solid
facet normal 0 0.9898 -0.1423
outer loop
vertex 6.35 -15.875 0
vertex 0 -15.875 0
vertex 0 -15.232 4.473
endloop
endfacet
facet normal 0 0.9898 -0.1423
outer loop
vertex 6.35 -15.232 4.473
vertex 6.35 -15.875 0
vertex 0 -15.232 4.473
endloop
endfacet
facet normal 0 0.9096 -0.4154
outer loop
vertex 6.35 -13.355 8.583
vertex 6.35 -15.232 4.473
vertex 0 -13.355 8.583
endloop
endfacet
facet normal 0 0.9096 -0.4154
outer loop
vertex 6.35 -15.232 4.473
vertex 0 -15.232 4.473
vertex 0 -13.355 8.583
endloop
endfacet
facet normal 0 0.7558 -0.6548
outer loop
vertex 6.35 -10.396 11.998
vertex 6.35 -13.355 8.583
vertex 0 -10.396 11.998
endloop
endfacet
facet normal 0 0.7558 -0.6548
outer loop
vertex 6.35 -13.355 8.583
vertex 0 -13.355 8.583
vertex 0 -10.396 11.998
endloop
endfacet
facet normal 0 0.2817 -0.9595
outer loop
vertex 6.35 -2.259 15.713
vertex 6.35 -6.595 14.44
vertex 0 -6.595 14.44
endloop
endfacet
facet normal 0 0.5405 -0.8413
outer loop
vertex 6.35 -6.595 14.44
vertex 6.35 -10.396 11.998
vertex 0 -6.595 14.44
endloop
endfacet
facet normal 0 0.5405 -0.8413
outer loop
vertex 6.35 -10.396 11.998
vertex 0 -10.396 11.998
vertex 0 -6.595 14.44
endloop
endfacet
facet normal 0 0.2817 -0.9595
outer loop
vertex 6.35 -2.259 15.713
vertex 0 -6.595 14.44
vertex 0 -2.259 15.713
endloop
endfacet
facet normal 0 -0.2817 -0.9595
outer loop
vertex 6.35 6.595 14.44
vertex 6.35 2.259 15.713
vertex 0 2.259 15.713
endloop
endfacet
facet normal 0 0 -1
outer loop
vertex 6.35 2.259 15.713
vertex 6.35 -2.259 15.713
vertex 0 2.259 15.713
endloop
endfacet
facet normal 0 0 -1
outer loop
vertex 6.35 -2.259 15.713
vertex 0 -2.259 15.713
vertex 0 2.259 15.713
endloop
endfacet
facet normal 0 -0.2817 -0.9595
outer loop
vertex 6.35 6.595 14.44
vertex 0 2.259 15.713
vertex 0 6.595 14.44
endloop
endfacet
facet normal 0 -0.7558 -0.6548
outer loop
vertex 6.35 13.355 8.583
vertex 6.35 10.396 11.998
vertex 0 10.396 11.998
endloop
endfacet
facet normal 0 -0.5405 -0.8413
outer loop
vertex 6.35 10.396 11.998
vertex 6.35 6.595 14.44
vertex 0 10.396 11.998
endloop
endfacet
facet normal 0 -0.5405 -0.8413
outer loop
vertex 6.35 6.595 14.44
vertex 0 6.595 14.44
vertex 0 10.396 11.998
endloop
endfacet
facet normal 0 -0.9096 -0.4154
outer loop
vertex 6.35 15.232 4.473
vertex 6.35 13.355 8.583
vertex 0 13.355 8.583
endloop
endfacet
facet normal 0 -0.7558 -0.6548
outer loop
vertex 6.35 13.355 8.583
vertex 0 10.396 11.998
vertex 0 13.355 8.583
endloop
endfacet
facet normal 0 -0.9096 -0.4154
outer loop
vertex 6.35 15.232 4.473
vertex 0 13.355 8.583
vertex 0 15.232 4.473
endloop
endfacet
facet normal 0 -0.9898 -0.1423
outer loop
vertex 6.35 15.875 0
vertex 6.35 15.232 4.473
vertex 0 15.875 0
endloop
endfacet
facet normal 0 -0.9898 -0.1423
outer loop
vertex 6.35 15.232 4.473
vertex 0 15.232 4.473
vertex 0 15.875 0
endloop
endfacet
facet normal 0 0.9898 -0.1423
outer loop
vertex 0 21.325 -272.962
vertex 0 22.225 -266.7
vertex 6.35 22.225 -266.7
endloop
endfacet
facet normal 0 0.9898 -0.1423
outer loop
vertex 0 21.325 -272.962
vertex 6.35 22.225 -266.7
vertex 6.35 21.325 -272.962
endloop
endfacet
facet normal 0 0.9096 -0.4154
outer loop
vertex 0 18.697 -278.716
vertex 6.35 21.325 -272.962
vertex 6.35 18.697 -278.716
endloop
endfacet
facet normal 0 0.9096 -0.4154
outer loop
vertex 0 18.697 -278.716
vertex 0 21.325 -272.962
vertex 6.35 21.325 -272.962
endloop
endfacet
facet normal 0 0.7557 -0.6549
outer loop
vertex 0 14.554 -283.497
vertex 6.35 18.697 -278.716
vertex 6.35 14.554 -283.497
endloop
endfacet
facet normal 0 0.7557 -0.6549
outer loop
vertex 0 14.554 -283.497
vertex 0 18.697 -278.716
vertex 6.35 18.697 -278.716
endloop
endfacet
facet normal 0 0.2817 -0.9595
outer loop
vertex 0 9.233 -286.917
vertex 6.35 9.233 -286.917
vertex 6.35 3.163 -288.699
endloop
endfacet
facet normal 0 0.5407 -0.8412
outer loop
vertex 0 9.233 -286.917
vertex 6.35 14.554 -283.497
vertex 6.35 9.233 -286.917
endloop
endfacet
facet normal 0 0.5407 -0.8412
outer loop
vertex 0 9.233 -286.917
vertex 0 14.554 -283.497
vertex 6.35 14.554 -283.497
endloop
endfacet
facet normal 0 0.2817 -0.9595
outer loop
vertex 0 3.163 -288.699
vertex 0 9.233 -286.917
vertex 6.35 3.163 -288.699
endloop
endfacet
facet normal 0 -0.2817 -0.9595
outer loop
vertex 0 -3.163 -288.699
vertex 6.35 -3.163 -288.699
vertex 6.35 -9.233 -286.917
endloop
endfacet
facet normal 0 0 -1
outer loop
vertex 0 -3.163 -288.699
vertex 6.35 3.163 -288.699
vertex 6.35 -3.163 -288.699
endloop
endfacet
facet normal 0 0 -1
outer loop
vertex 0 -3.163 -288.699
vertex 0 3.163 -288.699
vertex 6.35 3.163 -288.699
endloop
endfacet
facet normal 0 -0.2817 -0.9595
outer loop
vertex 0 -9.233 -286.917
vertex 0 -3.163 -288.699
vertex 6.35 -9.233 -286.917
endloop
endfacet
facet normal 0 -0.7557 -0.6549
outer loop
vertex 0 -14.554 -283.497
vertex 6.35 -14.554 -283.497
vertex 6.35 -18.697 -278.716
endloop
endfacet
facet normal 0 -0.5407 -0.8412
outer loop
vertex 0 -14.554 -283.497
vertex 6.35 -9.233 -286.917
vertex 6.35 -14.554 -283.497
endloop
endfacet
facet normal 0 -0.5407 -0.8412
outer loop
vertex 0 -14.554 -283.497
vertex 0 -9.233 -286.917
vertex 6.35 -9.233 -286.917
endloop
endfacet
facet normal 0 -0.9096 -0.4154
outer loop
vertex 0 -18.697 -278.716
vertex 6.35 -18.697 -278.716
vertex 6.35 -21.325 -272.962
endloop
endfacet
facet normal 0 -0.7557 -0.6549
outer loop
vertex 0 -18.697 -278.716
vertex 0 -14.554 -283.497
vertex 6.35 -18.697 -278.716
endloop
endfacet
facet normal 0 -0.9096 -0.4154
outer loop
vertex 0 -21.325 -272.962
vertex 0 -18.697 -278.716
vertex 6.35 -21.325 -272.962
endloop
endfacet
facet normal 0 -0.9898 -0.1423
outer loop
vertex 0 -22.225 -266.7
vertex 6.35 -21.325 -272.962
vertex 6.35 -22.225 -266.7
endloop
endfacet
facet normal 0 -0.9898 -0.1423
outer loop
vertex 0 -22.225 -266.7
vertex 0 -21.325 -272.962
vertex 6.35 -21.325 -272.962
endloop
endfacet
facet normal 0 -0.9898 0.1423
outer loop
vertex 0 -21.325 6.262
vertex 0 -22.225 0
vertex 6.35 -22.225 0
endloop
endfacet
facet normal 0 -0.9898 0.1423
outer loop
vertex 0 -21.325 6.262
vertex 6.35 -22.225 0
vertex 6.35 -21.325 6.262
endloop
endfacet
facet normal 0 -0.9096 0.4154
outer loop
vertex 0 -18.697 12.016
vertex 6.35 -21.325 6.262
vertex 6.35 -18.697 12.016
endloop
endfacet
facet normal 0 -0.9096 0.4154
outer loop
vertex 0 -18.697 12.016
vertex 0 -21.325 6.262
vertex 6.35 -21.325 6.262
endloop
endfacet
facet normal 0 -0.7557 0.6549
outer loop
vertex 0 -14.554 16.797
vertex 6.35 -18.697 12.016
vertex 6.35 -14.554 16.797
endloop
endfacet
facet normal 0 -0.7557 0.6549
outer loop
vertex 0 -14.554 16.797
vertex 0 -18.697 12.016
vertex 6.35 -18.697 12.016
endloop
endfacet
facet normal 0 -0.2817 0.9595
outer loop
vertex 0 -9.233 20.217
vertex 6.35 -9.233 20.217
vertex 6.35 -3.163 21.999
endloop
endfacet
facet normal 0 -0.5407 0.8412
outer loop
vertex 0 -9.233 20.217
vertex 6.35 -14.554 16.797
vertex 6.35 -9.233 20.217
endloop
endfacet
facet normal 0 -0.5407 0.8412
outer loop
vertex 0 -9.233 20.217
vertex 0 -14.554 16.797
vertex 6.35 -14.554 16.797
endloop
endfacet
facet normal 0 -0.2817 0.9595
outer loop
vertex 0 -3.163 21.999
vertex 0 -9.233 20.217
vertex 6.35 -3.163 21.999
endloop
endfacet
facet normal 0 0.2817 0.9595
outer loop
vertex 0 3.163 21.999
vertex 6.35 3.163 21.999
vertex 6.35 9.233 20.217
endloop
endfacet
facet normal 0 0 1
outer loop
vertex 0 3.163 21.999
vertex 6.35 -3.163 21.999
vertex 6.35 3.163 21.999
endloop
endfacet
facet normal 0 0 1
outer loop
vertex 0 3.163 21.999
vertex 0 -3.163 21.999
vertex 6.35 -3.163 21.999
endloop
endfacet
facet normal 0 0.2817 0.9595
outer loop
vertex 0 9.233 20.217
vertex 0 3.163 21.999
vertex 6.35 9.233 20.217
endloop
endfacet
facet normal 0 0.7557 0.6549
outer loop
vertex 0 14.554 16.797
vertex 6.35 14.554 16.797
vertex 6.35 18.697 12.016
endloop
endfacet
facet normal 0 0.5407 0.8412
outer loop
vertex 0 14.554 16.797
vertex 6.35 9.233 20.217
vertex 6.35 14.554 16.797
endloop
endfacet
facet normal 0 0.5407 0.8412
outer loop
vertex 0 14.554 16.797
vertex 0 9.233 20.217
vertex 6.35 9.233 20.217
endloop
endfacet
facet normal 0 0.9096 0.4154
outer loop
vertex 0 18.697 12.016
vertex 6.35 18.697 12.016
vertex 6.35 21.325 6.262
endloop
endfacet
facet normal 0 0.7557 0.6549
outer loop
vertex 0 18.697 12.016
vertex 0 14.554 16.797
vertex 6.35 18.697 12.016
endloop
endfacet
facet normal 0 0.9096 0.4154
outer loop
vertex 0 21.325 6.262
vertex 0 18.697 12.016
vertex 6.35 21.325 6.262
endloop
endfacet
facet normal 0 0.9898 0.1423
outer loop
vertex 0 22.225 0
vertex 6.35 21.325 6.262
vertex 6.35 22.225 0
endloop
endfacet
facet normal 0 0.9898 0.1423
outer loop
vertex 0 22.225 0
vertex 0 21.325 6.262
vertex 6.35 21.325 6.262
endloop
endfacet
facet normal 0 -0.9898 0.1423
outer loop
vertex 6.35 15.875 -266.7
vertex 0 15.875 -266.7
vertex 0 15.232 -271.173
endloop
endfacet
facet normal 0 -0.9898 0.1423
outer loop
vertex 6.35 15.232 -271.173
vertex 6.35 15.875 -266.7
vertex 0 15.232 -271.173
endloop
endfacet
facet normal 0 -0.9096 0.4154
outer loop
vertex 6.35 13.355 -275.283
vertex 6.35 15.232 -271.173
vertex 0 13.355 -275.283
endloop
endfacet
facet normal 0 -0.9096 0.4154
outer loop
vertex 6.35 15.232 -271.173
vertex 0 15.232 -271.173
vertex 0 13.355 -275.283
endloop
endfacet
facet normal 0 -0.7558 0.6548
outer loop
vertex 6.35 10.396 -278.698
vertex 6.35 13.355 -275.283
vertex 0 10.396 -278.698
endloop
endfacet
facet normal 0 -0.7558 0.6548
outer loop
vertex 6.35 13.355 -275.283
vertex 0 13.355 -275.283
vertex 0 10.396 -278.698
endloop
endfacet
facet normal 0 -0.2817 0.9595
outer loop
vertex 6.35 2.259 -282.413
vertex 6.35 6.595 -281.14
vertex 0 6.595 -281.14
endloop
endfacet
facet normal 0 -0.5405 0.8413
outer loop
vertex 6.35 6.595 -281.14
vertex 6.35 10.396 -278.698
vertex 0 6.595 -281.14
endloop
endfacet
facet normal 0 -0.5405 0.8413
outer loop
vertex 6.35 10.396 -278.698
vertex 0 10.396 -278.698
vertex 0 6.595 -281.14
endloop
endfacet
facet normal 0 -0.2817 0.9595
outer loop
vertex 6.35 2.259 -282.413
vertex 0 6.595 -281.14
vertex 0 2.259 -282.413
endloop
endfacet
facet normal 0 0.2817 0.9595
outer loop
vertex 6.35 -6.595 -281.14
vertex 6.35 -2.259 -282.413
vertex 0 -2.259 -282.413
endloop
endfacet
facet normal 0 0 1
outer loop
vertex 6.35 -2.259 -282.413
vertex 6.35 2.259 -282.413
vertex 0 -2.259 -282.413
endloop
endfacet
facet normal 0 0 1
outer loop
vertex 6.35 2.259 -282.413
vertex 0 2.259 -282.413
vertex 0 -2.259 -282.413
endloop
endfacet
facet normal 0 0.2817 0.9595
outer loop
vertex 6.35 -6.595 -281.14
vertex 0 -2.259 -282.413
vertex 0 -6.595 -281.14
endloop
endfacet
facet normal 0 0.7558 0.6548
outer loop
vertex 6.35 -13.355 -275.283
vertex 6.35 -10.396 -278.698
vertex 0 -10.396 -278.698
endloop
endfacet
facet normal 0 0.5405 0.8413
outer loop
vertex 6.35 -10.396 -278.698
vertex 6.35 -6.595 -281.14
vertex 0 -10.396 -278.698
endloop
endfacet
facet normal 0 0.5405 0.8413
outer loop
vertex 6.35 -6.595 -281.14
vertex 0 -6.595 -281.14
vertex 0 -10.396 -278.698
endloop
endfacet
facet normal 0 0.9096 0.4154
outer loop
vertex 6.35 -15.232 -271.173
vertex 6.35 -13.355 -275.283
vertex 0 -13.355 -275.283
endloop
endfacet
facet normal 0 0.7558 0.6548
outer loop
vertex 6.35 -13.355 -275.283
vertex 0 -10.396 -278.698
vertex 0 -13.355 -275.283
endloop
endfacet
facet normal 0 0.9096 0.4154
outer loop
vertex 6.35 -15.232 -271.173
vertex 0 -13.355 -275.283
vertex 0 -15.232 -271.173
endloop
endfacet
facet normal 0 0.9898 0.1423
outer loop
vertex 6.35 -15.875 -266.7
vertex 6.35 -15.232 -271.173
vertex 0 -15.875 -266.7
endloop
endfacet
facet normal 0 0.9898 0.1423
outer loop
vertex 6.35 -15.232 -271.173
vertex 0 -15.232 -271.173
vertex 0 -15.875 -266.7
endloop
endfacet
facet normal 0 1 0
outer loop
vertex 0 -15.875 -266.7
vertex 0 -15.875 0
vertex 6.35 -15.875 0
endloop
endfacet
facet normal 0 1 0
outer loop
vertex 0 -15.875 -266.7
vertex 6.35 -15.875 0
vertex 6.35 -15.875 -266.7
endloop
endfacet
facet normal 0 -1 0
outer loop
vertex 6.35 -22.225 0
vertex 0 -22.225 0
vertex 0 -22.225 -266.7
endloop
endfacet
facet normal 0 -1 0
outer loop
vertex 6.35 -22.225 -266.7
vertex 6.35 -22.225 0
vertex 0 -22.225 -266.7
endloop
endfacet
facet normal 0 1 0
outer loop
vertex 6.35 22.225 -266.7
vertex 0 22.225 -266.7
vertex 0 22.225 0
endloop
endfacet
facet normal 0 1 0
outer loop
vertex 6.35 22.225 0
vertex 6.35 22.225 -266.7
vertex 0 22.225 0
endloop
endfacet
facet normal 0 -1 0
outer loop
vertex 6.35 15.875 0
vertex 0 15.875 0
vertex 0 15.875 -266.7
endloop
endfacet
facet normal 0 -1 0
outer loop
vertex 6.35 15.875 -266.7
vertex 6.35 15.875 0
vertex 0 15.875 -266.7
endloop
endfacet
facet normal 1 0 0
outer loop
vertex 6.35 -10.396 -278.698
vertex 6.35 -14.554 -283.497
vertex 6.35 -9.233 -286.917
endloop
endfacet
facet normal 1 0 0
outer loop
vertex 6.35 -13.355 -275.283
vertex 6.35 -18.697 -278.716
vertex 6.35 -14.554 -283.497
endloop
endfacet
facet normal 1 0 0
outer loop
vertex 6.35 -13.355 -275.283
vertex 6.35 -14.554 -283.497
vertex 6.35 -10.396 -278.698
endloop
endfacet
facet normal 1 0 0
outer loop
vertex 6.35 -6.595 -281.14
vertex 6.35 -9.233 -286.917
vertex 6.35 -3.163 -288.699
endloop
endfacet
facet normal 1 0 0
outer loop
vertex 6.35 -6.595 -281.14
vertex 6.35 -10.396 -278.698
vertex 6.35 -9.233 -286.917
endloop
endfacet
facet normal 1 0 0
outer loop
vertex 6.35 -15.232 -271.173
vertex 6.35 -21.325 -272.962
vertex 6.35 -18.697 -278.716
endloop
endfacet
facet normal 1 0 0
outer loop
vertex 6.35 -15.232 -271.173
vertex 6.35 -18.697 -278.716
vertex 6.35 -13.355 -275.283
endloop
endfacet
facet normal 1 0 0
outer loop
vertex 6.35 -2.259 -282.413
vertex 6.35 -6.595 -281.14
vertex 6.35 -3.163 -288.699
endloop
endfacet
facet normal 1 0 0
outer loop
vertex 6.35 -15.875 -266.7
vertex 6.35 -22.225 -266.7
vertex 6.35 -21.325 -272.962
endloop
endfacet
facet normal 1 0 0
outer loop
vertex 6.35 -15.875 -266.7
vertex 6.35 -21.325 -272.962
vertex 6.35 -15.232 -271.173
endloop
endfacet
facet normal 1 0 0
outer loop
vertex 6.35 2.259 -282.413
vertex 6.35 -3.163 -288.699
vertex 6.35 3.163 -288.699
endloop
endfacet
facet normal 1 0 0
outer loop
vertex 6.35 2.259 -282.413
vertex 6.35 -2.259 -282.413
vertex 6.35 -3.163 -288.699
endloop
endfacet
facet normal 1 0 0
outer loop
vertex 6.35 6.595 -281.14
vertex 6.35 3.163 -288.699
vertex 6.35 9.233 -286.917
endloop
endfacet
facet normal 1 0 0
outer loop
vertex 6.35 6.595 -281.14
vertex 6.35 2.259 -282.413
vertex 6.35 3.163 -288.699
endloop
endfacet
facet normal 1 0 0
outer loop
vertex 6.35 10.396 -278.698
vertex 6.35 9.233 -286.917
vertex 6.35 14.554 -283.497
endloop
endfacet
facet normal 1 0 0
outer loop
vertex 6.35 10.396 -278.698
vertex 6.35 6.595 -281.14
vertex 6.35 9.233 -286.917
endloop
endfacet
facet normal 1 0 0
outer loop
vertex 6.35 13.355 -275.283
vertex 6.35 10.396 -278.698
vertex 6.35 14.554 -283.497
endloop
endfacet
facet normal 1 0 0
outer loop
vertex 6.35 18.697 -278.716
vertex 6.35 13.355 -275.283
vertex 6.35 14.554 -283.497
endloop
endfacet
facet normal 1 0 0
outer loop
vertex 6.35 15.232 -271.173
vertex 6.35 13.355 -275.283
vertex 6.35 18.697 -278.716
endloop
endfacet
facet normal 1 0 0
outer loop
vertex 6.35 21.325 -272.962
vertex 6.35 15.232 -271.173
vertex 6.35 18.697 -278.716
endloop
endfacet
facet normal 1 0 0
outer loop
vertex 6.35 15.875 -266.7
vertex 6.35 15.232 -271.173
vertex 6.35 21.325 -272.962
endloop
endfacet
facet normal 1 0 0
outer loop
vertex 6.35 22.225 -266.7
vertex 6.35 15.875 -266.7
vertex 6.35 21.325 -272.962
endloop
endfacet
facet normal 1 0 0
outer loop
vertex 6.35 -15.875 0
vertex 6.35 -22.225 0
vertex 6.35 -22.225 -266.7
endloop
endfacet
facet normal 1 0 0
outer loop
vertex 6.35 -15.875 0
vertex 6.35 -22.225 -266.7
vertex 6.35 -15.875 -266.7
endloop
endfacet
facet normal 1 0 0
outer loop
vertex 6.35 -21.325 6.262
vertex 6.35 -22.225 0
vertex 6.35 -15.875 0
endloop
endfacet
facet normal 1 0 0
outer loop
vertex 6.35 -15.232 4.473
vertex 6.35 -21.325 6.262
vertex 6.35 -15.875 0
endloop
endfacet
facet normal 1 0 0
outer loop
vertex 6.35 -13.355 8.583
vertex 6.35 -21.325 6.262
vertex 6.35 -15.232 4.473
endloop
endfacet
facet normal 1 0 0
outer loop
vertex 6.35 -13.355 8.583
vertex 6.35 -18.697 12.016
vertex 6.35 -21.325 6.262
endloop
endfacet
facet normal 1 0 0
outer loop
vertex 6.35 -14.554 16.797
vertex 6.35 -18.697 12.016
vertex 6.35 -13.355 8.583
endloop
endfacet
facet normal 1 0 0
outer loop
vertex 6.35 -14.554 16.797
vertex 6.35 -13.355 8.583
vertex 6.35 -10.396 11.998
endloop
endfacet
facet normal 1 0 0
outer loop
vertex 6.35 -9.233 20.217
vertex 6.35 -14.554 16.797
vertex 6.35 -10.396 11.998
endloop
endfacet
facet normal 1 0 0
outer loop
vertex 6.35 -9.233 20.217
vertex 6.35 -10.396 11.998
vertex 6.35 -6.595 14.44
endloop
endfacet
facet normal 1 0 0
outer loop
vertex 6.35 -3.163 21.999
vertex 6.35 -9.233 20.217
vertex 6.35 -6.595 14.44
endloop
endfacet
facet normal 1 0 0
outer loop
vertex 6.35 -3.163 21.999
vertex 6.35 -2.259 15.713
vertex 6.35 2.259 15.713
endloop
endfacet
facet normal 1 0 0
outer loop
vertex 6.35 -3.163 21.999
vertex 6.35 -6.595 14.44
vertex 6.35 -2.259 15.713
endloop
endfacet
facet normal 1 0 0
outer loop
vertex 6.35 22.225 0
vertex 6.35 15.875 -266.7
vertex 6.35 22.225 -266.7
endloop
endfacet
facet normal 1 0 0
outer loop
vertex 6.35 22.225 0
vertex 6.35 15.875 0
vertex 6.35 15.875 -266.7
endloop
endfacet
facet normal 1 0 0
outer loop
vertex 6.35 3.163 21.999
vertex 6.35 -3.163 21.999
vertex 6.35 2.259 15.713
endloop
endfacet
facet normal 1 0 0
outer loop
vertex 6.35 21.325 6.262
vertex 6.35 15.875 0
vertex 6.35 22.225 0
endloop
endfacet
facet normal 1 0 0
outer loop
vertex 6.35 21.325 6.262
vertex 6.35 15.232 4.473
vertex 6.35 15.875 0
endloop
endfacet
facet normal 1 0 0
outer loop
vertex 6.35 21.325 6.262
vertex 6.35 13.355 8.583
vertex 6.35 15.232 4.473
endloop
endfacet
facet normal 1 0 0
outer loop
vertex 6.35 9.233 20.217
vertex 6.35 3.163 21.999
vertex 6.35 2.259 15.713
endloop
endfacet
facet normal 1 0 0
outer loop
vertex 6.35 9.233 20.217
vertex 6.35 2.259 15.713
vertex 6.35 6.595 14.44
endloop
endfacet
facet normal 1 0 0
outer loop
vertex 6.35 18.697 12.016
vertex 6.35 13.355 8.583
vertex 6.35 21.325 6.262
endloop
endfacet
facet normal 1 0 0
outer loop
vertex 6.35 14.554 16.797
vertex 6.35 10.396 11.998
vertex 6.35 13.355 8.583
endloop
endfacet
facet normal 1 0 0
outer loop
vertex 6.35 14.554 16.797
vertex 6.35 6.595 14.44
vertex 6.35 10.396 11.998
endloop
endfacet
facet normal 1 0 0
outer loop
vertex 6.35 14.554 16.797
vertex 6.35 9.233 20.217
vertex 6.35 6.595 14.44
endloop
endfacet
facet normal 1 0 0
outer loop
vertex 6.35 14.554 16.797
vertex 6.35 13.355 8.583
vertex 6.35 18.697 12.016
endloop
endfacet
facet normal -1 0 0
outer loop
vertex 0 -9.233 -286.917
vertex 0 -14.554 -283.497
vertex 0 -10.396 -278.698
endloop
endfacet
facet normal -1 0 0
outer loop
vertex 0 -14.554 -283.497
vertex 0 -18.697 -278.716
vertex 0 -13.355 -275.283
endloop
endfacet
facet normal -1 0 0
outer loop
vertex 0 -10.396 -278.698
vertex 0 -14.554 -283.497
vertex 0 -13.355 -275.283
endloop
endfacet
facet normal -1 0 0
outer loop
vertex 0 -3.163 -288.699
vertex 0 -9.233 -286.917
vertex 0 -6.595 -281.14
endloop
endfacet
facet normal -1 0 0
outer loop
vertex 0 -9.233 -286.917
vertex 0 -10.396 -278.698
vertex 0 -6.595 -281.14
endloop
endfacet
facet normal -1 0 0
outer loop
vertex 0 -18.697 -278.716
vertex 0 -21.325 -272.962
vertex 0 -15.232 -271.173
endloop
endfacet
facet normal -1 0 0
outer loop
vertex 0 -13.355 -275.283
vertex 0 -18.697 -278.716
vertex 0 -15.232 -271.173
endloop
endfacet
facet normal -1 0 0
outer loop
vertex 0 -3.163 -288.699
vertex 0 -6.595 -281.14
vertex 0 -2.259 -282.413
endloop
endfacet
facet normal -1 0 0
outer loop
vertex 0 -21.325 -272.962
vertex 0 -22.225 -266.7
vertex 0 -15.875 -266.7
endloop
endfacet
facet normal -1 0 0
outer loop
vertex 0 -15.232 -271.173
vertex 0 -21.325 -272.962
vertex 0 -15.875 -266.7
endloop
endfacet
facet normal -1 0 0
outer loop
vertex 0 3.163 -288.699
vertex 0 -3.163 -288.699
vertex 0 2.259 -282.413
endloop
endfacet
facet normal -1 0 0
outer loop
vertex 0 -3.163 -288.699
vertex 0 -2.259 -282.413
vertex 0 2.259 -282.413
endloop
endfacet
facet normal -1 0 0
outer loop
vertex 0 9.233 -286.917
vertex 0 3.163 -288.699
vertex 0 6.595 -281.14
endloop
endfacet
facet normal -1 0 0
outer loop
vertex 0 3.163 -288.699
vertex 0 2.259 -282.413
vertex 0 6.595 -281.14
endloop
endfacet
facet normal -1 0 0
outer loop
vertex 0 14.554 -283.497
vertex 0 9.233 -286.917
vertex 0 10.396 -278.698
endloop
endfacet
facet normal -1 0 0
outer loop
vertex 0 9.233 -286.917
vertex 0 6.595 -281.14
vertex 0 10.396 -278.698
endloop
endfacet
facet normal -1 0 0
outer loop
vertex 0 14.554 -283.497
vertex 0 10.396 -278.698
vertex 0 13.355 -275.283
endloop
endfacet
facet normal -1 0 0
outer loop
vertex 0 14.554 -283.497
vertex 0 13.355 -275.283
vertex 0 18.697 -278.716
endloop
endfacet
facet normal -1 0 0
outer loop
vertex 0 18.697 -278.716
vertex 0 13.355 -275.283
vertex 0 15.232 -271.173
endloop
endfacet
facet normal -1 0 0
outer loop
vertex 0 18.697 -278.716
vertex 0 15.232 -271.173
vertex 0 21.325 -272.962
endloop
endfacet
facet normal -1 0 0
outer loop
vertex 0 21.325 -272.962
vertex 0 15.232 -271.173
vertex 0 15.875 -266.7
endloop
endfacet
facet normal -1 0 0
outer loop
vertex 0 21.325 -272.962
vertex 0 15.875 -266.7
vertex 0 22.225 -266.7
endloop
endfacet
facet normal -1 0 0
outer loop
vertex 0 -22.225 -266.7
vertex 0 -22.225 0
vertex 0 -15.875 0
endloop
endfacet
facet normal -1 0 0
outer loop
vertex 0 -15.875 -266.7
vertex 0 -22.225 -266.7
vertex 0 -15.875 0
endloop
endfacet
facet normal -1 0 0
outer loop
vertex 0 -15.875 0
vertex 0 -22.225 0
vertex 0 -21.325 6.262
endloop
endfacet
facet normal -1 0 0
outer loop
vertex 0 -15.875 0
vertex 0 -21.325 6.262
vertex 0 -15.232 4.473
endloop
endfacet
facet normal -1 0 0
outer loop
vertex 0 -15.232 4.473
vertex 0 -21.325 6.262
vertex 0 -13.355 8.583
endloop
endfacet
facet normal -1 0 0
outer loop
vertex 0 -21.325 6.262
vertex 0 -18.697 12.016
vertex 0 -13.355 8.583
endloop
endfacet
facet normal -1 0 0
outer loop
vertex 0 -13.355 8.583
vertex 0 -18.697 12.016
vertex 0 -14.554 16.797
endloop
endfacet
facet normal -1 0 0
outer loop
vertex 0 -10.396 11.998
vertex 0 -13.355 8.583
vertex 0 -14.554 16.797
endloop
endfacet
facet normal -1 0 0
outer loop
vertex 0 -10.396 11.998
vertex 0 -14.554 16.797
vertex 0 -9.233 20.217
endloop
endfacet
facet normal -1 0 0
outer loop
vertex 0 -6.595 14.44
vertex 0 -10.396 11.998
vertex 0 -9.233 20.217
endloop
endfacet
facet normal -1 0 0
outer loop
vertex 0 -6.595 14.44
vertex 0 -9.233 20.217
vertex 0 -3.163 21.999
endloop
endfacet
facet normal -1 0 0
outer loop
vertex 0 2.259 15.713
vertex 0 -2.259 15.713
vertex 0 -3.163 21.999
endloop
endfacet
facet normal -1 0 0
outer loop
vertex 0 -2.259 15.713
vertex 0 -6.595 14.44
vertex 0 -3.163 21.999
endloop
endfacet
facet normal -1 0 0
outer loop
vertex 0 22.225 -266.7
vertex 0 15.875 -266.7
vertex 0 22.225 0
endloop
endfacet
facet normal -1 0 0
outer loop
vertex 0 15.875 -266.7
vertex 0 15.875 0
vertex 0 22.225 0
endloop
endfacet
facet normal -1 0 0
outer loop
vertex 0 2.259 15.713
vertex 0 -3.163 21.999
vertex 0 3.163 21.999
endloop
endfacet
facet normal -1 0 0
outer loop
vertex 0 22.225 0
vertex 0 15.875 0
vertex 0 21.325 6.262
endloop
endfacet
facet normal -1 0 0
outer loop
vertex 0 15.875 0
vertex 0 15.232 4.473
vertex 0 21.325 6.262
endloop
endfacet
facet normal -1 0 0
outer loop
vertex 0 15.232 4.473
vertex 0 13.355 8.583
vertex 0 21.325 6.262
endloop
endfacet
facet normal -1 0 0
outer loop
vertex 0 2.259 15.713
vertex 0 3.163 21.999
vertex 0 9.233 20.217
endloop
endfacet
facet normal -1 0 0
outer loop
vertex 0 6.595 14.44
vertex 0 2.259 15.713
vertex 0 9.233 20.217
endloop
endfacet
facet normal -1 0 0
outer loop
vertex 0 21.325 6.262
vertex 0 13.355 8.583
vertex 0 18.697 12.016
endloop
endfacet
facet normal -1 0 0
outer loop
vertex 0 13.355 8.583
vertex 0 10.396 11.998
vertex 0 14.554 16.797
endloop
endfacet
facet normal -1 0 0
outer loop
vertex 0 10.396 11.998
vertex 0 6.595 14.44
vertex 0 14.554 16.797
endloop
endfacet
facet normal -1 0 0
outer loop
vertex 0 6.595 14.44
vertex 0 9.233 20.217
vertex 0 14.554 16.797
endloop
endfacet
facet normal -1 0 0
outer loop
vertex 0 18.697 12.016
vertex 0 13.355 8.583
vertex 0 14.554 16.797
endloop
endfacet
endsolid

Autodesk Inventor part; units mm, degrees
ref_plane "YZ Plane" through (0, 0, 0) normal (1, 0, 0) x (0, 1, 0)
ref_plane "XZ Plane" through (0, 0, 0) normal (0, 1, 0) x (-1, 0, 0)
ref_plane "XY Plane" through (0, 0, 0) normal (0, 0, 1) x (1, 0, 0)
sketch "Sketch1" plane through (0, 0, 0) normal (1, 0, 0) x (0, 1, 0)
  line L0 (0, 0) -> (0, -266.7) construction
  line L1 (0, 0) -> (15.875, 0) construction
  line L2 (0, 0) -> (-15.875, 0) construction
  line L3 (0, -266.7) -> (15.875, -266.7) construction
  line L4 (0, -266.7) -> (15.875, -266.7) construction
  line L5 (0, -266.7) -> (-15.875, -266.7) construction
  line L6 (0, -266.7) -> (15.875, -266.7) construction
  arc A0 (15.875, 0) -> (-15.875, 0) centre (0, 0) ccw
  line L7 (15.875, 0) -> (15.875, -266.7)
  line L8 (-15.875, 0) -> (-15.875, -266.7)
  arc A1 (-15.875, -266.7) -> (15.875, -266.7) centre (0, -266.7) ccw
  line L9 (22.225, -266.7) -> (22.225, 0)
  arc A2 (22.225, 0) -> (-22.225, 0) centre (0, 0) ccw
  line L10 (-22.225, 0) -> (-22.225, -266.7)
  arc A3 (-22.225, -266.7) -> (22.225, -266.7) centre (0, -266.7) ccw
  dimension "d0" = 266.7
  dimension "d3" = 15.875
  dimension "d4" = 15.875
  dimension "d5" = 15.875
  dimension "d6" = 0
  dimension "d7" = 15.875
  dimension "d8" = 180
  dimension "d9" = 15.875
  dimension "d10" = 15.875
  dimension "d11" = 6.35
extrude "Extrusion1" add sketch "Sketch1" along normal blind 6.35
properties part number "chain"
